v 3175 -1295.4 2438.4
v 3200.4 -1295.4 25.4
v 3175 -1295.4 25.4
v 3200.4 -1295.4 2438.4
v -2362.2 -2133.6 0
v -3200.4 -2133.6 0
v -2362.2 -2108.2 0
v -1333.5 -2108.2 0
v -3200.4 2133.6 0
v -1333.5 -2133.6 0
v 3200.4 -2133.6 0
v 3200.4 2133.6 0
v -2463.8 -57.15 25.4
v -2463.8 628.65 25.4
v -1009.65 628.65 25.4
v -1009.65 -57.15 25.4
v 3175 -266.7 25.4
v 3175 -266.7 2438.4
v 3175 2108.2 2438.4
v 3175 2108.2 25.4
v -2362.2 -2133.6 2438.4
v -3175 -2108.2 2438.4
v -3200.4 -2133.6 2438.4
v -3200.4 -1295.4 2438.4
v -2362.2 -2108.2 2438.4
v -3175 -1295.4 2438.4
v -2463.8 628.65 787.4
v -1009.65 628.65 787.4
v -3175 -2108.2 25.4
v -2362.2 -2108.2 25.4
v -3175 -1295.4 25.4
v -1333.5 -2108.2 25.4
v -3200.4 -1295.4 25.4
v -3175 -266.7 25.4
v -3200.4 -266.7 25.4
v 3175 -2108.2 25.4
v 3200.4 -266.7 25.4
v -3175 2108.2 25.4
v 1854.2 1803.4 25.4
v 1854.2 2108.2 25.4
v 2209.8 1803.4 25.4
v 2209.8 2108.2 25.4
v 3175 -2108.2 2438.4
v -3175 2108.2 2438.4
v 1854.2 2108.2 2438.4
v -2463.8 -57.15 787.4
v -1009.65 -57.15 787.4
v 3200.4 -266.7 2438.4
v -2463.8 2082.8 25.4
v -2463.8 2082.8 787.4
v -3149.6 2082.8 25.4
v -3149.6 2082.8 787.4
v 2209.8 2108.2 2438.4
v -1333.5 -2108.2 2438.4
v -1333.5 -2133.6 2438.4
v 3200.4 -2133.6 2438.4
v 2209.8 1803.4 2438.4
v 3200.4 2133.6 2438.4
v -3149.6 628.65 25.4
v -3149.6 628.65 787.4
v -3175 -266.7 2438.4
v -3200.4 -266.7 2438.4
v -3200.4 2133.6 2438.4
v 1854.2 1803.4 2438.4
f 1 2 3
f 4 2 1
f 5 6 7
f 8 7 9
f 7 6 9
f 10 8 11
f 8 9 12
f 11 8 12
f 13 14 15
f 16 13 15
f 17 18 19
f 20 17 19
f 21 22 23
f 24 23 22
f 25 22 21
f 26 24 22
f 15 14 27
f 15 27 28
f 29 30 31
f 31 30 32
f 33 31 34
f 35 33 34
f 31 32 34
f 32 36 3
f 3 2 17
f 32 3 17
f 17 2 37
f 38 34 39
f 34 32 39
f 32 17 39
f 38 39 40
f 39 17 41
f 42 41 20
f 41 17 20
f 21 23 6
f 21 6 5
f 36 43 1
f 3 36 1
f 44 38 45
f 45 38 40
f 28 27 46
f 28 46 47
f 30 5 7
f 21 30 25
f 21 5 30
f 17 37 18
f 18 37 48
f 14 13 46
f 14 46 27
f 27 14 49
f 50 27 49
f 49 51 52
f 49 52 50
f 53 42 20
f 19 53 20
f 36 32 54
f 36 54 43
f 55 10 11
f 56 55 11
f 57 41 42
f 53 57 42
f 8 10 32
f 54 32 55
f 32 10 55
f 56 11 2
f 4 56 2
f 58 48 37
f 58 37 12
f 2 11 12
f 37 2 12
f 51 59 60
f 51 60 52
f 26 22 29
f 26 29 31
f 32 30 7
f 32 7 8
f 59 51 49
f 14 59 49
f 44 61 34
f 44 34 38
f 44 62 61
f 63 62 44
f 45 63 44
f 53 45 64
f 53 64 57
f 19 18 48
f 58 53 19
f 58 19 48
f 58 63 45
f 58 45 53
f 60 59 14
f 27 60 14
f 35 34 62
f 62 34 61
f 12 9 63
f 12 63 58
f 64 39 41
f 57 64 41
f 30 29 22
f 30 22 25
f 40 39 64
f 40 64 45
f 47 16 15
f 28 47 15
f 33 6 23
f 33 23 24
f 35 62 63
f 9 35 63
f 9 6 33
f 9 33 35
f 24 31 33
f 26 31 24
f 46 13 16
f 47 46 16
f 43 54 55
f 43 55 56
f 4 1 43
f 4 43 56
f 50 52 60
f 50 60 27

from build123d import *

# Parameters (mm, degrees)
F0_W      = 6400.8
F0_H      = 4267.2
F1_DEPTH  = 2438.4
F2_T      = -25.4
F3_W      = 1028.7
F3_H      = 2413
F4_DEPTH  = 6400.8
F5_W      = 1028.7
F5_H      = 2438.4
F6_DEPTH  = 25.4
F7_W      = 355.6
F7_H      = 304.8
F8_DEPTH  = 2413
F9_W      = 685.8
F9_H      = 1454.15
F10_DEPTH = 762
F11_W     = 1454.15
F11_H     = 685.8
F12_DEPTH = 762


with BuildPart() as f1:
    # F0 (on Top) → F1 (new body)
    with BuildSketch(Plane.XY):
        Rectangle(F0_W, F0_H)
    extrude(amount=F1_DEPTH)

    # F2
    f2_openings = [f1.faces().sort_by_distance(p)[0] for p in [
        (0, 0, 2438.4),
    ]]
    offset(amount=F2_T, openings=f2_openings)

    # F3 (on face) → F4 (cut, through all)
    with BuildSketch(Plane.YZ.offset(3200.4)):
        with Locations((-781.05, 1231.9)):
            Rectangle(F3_W, F3_H)
    extrude(amount=-F4_DEPTH, mode=Mode.SUBTRACT)

    # F5 (on face) → F6 (cut)
    with BuildSketch(Plane.XZ.offset(2133.6)):
        with Locations((-1847.85, 1219.2)):
            Rectangle(F5_W, F5_H)
    extrude(amount=-F6_DEPTH, mode=Mode.SUBTRACT)

    # F7 (on face) → F8 (join, through all)
    with BuildSketch(Plane.XY.offset(25.4)):
        with Locations((2032, 1955.8)):
            Rectangle(F7_W, F7_H)
    extrude(amount=F8_DEPTH)


with BuildPart() as f10:
    # F9 (on face) → F10 (new body)
    with BuildSketch(Plane.XY.offset(25.4)):
        with Locations((-2806.7, 1355.725)):
            Rectangle(F9_W, F9_H)
    extrude(amount=F10_DEPTH)


with BuildPart() as f12:
    # F11 (on face) → F12 (new body)
    with BuildSketch(Plane.XY.offset(25.4)):
        with Locations((-1736.725, 285.75)):
            Rectangle(F11_W, F11_H)
    extrude(amount=F12_DEPTH)


solid = Compound([f1.part, f10.part, f12.part])
